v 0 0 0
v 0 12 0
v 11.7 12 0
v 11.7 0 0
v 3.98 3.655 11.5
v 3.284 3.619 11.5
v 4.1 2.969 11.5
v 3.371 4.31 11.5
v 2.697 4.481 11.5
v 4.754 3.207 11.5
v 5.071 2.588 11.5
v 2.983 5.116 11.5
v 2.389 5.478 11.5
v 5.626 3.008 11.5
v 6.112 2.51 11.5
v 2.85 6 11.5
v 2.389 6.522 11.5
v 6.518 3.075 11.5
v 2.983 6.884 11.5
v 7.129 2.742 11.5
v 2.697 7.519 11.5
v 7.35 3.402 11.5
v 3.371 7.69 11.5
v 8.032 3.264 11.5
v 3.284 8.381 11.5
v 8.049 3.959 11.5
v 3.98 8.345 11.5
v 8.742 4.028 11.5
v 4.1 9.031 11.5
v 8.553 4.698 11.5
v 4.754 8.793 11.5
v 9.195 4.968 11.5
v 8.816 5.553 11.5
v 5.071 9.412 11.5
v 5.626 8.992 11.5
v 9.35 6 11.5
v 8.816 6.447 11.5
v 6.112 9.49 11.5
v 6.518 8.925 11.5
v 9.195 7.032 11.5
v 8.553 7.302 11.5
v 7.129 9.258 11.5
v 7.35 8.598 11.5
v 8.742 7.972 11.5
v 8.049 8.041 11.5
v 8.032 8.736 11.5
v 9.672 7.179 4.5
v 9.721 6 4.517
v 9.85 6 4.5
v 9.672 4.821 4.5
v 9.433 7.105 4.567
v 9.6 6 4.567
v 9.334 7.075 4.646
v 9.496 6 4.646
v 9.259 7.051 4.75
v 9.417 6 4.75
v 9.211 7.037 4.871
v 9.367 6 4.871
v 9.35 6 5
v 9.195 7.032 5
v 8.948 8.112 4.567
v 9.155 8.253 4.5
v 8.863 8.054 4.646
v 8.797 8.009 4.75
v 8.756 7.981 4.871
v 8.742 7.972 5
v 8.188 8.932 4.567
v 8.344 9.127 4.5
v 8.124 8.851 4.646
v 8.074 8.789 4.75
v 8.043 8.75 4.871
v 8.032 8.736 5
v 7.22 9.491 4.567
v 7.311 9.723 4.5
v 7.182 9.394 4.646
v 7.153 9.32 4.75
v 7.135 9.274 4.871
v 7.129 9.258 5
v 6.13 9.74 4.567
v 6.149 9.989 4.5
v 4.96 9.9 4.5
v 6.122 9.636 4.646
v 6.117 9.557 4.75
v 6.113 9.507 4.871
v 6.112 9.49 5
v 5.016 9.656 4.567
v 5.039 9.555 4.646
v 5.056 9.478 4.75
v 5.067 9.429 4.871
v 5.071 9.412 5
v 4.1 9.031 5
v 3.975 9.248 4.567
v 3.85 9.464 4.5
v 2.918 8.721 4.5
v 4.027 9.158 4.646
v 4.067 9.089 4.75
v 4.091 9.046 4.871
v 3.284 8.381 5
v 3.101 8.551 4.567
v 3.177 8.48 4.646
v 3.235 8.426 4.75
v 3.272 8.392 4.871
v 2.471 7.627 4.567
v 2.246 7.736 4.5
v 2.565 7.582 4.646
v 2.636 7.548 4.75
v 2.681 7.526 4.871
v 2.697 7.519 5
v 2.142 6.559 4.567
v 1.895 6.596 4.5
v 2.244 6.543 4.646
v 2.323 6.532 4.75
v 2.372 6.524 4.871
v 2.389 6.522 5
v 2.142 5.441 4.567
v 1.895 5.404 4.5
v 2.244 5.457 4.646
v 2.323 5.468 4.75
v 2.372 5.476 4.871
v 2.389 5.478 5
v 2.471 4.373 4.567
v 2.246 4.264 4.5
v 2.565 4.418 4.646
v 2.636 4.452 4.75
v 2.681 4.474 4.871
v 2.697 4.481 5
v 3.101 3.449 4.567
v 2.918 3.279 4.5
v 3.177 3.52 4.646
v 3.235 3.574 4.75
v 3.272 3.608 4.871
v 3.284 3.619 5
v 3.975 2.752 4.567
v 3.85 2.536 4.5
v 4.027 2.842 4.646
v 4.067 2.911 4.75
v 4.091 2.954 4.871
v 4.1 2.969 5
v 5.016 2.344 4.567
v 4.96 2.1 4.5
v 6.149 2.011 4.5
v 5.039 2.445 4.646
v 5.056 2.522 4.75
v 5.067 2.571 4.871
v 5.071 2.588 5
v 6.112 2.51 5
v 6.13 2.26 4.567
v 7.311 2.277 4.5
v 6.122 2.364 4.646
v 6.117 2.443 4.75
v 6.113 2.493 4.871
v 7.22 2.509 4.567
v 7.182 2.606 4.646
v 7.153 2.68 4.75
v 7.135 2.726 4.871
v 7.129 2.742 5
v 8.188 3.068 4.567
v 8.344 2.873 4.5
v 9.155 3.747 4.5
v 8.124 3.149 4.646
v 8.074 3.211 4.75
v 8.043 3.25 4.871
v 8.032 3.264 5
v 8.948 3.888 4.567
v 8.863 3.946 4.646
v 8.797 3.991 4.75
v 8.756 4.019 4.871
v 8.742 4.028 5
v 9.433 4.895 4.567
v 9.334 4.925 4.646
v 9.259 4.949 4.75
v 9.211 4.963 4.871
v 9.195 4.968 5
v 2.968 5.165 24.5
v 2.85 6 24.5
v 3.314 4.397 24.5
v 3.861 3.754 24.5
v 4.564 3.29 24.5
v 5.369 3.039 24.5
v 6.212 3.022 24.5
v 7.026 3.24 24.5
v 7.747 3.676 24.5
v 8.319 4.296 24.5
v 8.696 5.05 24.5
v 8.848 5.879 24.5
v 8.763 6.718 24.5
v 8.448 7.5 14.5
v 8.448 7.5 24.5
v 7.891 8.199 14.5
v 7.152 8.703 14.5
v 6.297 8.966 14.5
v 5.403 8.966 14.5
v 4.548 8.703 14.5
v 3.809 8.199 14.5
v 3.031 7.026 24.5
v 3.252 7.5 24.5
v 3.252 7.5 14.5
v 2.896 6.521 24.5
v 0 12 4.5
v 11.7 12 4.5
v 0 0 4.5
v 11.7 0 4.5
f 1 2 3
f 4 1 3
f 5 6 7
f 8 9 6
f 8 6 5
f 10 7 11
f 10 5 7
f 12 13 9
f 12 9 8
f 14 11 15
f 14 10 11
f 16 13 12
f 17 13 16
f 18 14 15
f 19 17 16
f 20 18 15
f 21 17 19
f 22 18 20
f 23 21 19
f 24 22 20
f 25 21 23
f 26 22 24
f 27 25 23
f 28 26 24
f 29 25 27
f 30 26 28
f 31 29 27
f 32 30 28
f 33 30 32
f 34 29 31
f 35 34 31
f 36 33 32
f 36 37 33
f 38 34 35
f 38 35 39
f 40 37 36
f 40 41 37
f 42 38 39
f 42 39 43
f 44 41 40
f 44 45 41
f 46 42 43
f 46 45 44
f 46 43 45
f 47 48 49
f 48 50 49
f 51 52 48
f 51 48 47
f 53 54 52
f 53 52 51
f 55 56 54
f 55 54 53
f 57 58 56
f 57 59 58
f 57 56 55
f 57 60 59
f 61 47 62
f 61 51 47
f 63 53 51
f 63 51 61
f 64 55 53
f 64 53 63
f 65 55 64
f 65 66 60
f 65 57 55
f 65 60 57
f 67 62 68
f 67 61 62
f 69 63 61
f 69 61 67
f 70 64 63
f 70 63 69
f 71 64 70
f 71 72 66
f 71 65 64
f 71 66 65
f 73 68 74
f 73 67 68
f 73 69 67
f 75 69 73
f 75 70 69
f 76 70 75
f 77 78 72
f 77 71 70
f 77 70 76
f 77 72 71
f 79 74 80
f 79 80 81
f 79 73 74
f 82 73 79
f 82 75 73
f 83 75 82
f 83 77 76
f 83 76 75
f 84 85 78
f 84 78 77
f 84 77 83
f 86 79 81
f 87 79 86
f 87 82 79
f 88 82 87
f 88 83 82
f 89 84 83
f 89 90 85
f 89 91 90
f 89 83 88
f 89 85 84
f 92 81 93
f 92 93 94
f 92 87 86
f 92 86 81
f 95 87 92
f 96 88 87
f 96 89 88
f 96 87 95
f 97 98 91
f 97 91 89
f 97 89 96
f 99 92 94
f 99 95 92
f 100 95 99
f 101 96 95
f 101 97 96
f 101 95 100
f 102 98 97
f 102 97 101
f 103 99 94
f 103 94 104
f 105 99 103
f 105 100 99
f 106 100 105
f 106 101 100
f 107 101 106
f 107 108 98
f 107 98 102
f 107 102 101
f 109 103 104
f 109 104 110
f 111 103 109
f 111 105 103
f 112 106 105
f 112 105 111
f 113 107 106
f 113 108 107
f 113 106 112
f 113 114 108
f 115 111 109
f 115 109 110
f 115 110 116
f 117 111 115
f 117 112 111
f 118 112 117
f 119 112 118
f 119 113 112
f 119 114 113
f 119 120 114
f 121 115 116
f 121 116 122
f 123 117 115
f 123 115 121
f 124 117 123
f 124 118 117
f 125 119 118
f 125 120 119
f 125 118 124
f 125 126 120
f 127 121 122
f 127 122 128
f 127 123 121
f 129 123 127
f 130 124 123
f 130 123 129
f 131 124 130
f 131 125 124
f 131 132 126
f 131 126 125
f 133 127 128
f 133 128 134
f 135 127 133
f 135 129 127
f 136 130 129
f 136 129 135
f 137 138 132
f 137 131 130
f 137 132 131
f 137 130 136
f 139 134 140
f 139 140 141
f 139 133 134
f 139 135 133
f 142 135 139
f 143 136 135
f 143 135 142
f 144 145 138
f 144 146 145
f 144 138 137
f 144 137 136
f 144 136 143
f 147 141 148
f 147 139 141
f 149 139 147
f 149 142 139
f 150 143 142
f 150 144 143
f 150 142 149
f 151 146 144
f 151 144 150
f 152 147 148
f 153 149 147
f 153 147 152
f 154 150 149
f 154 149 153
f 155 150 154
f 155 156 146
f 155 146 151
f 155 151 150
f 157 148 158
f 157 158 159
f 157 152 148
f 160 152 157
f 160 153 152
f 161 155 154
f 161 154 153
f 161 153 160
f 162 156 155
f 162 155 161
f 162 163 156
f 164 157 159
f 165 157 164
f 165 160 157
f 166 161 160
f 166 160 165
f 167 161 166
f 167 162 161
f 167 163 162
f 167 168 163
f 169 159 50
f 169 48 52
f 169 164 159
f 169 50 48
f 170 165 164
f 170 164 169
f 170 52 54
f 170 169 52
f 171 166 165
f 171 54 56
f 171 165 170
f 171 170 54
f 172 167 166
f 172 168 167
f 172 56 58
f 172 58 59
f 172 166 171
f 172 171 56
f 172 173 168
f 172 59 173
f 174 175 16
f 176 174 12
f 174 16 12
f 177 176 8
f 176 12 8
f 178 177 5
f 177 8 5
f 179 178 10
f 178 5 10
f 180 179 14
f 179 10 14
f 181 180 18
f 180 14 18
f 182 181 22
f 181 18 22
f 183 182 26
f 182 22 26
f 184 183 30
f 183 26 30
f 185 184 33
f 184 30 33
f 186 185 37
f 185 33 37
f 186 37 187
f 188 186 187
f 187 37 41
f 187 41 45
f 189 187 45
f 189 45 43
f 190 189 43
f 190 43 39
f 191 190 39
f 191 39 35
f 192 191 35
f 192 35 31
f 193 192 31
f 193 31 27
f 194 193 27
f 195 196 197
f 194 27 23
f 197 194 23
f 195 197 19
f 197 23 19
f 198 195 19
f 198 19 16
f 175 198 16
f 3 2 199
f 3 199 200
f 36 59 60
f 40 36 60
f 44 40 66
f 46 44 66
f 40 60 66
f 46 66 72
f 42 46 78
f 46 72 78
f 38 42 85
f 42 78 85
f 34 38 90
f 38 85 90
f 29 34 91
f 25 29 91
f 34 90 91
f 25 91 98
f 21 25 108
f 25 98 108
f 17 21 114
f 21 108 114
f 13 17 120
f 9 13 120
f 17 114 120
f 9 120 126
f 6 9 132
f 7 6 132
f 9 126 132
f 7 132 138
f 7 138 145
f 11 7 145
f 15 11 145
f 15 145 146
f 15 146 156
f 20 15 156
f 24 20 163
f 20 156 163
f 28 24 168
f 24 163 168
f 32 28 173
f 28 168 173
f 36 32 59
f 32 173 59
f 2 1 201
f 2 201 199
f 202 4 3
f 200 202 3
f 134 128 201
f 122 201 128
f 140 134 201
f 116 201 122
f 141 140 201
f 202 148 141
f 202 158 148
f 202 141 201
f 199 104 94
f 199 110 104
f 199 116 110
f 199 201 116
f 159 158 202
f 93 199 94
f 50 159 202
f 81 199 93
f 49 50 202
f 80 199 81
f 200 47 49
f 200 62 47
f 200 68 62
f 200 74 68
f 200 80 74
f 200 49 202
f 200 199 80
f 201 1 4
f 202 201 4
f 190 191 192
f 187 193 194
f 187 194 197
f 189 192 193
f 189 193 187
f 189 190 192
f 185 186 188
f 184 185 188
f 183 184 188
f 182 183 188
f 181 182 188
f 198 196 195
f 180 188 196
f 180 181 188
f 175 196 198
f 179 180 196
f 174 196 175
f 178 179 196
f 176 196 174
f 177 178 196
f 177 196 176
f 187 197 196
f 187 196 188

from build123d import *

# Parameters (mm, degrees)
SKETCH_1_W          = 11.7
SKETCH_1_H          = 12
EXTRUDE_1_DEPTH     = 4.5
SKETCH_2_R          = 3.5
EXTRUDE_2_DEPTH     = 7
SKETCH_3_R          = 3
EXTRUDE_3_DEPTH     = 13
CUT_EXTRUDE_START   = -10
CUT_EXTRUDE_1_DEPTH = 10
FILLET_1_R          = 0.5


with BuildPart() as part:
    # 草图1 → 凸台-拉伸1 (new body)
    with BuildSketch(Plane.XY):
        with Locations((5.85, 6)):
            Rectangle(SKETCH_1_W, SKETCH_1_H)
    extrude(amount=EXTRUDE_1_DEPTH)

    # 草图2 → 凸台-拉伸2 (add)
    with BuildSketch(Plane.XY.offset(4.5)):
        with Locations((5.85, 6)):
            Circle(SKETCH_2_R)
    extrude(amount=EXTRUDE_2_DEPTH)

    # 草图3 → 凸台-拉伸3 (add)
    with BuildSketch(Plane.XY.offset(11.5)):
        with Locations(Location((5.85, 6, 0), (0, 0, 180))):
            Circle(SKETCH_3_R)
    extrude(amount=EXTRUDE_3_DEPTH)

    # 草图4 → 切除-拉伸1 (cut)
    with BuildSketch(Plane.XY.offset(24.5).offset(CUT_EXTRUDE_START)):
        with BuildLine():
            Line((3.251923789, 7.5), (8.448076211, 7.5))
            ThreePointArc((8.448076211, 7.5), (5.85, 9), (3.251923789, 7.5))
        make_face()
    extrude(amount=CUT_EXTRUDE_1_DEPTH, mode=Mode.SUBTRACT)

    # 圆角1
    fillet_1_edges = [part.edges().sort_by_distance(p)[0] for p in [
        (2.35, 6, 4.5),
    ]]
    fillet(fillet_1_edges, radius=FILLET_1_R)


solid = part.part
